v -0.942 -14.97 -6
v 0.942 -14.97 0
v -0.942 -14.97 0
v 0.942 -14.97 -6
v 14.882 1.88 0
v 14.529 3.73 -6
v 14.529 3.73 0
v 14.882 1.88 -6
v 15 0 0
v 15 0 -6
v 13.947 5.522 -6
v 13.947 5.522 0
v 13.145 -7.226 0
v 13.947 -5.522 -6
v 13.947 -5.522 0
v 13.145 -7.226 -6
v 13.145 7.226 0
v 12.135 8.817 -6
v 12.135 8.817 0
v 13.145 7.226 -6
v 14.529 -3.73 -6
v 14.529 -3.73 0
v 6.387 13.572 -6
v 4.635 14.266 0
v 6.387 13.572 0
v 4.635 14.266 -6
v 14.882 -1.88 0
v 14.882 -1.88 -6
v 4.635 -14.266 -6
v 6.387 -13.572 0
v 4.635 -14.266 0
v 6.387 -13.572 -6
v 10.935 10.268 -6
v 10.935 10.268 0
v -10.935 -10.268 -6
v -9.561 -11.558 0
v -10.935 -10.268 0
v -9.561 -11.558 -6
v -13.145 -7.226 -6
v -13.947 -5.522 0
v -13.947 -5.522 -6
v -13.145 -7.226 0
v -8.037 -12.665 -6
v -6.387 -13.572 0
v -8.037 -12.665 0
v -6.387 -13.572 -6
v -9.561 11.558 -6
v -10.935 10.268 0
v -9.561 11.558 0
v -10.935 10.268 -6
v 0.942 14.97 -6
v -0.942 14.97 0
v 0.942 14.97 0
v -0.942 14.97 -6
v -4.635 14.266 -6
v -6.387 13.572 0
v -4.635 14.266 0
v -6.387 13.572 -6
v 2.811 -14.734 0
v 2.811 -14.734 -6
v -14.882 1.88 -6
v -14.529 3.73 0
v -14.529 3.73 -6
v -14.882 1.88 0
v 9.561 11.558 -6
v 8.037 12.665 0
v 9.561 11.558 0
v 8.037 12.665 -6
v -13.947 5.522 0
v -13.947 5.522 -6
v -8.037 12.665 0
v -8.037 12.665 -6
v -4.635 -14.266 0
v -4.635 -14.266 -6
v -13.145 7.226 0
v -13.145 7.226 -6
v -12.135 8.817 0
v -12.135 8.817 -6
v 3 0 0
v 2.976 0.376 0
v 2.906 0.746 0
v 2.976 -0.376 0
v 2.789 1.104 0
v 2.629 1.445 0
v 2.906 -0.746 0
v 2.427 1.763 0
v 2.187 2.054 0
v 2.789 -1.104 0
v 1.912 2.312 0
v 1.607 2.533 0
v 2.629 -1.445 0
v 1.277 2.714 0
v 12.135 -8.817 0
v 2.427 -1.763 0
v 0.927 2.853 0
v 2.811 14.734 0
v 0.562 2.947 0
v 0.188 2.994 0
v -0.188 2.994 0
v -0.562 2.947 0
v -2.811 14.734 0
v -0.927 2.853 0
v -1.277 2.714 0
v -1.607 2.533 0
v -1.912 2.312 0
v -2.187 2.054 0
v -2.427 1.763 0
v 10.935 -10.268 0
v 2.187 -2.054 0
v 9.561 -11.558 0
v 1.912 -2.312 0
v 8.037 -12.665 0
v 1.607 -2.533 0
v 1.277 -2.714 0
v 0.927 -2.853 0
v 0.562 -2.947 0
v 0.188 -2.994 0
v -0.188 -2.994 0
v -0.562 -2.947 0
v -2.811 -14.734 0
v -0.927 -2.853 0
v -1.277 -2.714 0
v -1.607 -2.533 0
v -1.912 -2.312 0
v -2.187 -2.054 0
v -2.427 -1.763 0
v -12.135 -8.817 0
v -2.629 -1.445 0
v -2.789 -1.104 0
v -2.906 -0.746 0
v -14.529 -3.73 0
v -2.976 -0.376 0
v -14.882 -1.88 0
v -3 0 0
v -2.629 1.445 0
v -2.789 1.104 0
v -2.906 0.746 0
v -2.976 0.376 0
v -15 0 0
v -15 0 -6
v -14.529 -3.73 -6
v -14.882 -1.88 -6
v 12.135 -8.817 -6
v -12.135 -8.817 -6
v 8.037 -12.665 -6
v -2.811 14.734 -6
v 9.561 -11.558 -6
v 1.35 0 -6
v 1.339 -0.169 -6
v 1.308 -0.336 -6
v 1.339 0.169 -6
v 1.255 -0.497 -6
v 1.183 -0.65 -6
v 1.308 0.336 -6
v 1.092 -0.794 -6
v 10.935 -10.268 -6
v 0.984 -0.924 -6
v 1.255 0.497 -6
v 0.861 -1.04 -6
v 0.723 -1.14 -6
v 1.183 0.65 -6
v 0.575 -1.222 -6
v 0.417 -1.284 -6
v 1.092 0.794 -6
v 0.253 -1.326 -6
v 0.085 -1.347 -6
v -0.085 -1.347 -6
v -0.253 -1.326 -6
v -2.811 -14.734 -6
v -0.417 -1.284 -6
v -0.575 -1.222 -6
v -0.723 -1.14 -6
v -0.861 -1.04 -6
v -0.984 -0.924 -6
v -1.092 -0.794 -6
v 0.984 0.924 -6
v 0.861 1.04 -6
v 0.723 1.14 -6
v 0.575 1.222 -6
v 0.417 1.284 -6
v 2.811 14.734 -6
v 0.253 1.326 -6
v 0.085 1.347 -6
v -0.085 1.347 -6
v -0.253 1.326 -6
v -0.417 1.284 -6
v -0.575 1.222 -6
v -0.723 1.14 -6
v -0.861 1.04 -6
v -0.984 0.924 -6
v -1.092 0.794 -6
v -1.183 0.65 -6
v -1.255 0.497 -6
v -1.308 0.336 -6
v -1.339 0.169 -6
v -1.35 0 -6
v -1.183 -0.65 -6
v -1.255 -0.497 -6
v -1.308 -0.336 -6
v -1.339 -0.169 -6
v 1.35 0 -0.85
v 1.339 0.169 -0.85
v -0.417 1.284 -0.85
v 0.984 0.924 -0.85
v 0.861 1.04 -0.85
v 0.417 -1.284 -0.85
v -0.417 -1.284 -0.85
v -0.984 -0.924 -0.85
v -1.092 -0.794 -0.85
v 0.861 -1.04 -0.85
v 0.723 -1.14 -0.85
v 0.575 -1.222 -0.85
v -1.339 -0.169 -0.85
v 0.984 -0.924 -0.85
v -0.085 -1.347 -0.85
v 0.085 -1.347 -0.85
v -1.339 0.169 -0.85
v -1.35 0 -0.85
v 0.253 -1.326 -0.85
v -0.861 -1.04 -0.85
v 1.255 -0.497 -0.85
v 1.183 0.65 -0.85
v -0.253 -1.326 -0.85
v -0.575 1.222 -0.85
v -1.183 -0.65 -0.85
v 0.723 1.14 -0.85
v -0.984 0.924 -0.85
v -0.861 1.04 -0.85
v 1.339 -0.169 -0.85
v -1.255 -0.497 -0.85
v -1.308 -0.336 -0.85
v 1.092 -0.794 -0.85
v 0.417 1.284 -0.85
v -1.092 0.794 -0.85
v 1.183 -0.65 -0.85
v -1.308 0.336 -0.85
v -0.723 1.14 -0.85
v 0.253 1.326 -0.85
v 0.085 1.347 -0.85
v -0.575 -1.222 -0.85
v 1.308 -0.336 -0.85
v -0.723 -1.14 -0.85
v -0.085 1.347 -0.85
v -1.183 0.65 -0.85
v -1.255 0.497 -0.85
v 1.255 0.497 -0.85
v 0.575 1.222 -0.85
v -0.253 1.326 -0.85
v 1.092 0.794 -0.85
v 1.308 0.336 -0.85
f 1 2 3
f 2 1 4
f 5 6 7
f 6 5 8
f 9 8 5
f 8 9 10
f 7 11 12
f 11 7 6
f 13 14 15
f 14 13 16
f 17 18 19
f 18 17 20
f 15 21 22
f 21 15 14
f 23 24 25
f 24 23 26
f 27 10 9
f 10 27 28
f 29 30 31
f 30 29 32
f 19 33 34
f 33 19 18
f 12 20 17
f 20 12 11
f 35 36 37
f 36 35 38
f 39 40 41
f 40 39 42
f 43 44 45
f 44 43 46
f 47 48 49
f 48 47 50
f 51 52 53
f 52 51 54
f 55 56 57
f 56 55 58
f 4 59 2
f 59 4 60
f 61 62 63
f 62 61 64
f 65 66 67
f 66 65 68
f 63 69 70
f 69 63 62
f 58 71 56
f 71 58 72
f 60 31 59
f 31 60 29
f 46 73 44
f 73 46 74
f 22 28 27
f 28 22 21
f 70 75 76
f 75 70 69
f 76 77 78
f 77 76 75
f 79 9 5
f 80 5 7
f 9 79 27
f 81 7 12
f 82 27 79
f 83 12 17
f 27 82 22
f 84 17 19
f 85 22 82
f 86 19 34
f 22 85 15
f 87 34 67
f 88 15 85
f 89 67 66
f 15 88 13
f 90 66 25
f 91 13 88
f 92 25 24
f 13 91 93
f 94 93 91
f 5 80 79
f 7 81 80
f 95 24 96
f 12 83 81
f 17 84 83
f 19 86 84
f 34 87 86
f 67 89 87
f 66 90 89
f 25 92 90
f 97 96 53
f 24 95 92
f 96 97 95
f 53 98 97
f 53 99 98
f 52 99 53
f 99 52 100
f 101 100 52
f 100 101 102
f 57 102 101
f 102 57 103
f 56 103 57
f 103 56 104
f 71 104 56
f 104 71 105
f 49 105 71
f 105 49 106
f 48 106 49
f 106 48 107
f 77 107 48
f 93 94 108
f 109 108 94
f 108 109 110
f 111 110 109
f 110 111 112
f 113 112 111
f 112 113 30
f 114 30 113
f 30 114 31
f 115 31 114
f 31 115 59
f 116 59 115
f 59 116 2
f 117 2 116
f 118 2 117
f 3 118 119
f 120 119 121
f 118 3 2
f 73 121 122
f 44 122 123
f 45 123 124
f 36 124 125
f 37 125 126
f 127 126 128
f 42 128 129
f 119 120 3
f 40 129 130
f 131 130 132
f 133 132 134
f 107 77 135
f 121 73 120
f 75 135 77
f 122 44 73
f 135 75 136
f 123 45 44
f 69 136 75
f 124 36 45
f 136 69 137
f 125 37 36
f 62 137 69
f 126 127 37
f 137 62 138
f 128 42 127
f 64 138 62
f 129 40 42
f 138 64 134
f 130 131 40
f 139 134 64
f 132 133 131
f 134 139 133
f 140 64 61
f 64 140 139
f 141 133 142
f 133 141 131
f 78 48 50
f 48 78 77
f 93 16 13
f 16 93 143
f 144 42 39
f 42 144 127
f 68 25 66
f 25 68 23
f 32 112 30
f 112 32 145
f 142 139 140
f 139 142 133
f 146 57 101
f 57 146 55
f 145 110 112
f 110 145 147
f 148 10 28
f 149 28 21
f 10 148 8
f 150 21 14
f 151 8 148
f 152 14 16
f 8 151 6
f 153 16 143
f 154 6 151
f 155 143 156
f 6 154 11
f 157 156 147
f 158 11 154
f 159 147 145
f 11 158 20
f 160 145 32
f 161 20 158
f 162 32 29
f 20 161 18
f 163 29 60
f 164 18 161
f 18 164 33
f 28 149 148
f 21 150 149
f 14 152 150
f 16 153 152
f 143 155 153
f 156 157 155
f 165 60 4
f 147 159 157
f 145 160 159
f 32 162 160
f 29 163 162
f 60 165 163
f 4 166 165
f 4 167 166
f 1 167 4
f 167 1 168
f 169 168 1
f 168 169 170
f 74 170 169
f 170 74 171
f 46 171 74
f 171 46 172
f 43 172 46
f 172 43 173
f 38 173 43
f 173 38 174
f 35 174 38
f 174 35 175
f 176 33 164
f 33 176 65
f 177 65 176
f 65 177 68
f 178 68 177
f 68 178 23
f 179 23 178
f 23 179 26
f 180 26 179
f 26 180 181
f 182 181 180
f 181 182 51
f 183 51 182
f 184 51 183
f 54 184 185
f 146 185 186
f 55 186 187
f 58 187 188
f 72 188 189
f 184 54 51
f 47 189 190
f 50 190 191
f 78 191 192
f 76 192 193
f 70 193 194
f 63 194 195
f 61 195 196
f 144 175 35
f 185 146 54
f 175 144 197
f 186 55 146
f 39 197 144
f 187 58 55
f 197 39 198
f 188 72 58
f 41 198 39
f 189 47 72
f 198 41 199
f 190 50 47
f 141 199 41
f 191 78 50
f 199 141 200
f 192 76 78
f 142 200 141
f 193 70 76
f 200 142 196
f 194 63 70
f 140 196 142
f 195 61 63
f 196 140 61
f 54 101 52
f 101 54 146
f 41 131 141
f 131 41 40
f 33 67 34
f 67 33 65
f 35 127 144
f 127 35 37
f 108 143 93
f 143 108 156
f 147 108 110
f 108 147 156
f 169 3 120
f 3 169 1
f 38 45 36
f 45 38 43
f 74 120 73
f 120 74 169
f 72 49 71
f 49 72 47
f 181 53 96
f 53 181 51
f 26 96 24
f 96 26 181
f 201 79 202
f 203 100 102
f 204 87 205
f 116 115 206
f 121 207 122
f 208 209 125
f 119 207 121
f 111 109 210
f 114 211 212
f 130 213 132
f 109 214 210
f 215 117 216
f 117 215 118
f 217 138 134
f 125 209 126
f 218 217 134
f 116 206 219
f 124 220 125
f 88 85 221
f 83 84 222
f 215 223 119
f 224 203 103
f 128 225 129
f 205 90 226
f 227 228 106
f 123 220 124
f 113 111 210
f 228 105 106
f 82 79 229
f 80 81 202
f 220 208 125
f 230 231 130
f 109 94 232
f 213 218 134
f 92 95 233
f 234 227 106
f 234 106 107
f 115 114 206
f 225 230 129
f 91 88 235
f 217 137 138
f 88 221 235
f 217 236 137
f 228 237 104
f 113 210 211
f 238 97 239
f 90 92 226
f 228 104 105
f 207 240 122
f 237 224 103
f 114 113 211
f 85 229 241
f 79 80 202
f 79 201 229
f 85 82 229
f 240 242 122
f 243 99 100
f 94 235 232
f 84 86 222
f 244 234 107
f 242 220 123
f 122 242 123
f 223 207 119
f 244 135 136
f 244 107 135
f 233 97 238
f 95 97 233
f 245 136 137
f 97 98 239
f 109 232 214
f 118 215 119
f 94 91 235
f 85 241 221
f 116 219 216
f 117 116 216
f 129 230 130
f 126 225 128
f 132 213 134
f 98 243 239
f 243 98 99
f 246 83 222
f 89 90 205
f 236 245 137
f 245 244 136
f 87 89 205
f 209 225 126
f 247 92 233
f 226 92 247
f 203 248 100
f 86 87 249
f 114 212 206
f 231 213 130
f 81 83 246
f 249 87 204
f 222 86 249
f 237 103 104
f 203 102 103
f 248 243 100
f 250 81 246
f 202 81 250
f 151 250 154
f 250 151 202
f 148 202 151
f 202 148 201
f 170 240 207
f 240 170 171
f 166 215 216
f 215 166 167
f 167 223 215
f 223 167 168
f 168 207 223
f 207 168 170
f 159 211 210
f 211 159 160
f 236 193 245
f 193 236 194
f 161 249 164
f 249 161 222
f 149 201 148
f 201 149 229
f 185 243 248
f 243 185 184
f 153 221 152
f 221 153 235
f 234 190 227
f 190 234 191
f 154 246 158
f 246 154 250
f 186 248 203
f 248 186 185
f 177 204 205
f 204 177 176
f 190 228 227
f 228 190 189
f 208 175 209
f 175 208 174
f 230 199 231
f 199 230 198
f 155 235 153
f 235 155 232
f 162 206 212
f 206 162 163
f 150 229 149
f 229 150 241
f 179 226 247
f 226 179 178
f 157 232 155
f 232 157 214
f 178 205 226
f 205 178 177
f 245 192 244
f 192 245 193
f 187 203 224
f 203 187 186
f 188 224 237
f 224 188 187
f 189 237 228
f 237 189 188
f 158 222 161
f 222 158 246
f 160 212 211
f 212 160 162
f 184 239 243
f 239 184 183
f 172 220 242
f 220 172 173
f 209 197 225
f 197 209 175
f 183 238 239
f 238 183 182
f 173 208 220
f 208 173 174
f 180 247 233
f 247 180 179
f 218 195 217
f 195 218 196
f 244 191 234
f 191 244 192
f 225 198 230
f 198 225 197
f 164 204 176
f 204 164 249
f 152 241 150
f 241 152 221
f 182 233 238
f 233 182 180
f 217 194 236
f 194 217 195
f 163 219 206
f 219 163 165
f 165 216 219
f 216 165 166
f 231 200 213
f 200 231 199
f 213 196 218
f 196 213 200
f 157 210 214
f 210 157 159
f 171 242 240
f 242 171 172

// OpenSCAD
$fn = 50;


difference() {
	union() {
		translate(v = [0, 0, -6.0000000000]) {
			cylinder(h = 6, r = 15.0000000000);
		}
		translate(v = [0, 0, -6.0000000000]) {
			cylinder(h = 6, r = 2.8750000000);
		}
	}
	union() {
		translate(v = [0, 0, 0]) {
			rotate(a = [0, 0, 0]) {
				difference() {
					union() {
						translate(v = [0, 0, -6.0000000000]) {
							cylinder(h = 6, r = 1.0000000000);
						}
						translate(v = [0, 0, -0.8500000000]) {
							cylinder(h = 0.8500000000, r1 = 1.3500000000, r2 = 3.0000000000);
						}
						translate(v = [0, 0, -6.0000000000]) {
							cylinder(h = 6, r = 1.3500000000);
						}
						translate(v = [0, 0, -6.0000000000]) {
							cylinder(h = 6, r = 1.0000000000);
						}
					}
					union();
				}
			}
		}
	}
}
